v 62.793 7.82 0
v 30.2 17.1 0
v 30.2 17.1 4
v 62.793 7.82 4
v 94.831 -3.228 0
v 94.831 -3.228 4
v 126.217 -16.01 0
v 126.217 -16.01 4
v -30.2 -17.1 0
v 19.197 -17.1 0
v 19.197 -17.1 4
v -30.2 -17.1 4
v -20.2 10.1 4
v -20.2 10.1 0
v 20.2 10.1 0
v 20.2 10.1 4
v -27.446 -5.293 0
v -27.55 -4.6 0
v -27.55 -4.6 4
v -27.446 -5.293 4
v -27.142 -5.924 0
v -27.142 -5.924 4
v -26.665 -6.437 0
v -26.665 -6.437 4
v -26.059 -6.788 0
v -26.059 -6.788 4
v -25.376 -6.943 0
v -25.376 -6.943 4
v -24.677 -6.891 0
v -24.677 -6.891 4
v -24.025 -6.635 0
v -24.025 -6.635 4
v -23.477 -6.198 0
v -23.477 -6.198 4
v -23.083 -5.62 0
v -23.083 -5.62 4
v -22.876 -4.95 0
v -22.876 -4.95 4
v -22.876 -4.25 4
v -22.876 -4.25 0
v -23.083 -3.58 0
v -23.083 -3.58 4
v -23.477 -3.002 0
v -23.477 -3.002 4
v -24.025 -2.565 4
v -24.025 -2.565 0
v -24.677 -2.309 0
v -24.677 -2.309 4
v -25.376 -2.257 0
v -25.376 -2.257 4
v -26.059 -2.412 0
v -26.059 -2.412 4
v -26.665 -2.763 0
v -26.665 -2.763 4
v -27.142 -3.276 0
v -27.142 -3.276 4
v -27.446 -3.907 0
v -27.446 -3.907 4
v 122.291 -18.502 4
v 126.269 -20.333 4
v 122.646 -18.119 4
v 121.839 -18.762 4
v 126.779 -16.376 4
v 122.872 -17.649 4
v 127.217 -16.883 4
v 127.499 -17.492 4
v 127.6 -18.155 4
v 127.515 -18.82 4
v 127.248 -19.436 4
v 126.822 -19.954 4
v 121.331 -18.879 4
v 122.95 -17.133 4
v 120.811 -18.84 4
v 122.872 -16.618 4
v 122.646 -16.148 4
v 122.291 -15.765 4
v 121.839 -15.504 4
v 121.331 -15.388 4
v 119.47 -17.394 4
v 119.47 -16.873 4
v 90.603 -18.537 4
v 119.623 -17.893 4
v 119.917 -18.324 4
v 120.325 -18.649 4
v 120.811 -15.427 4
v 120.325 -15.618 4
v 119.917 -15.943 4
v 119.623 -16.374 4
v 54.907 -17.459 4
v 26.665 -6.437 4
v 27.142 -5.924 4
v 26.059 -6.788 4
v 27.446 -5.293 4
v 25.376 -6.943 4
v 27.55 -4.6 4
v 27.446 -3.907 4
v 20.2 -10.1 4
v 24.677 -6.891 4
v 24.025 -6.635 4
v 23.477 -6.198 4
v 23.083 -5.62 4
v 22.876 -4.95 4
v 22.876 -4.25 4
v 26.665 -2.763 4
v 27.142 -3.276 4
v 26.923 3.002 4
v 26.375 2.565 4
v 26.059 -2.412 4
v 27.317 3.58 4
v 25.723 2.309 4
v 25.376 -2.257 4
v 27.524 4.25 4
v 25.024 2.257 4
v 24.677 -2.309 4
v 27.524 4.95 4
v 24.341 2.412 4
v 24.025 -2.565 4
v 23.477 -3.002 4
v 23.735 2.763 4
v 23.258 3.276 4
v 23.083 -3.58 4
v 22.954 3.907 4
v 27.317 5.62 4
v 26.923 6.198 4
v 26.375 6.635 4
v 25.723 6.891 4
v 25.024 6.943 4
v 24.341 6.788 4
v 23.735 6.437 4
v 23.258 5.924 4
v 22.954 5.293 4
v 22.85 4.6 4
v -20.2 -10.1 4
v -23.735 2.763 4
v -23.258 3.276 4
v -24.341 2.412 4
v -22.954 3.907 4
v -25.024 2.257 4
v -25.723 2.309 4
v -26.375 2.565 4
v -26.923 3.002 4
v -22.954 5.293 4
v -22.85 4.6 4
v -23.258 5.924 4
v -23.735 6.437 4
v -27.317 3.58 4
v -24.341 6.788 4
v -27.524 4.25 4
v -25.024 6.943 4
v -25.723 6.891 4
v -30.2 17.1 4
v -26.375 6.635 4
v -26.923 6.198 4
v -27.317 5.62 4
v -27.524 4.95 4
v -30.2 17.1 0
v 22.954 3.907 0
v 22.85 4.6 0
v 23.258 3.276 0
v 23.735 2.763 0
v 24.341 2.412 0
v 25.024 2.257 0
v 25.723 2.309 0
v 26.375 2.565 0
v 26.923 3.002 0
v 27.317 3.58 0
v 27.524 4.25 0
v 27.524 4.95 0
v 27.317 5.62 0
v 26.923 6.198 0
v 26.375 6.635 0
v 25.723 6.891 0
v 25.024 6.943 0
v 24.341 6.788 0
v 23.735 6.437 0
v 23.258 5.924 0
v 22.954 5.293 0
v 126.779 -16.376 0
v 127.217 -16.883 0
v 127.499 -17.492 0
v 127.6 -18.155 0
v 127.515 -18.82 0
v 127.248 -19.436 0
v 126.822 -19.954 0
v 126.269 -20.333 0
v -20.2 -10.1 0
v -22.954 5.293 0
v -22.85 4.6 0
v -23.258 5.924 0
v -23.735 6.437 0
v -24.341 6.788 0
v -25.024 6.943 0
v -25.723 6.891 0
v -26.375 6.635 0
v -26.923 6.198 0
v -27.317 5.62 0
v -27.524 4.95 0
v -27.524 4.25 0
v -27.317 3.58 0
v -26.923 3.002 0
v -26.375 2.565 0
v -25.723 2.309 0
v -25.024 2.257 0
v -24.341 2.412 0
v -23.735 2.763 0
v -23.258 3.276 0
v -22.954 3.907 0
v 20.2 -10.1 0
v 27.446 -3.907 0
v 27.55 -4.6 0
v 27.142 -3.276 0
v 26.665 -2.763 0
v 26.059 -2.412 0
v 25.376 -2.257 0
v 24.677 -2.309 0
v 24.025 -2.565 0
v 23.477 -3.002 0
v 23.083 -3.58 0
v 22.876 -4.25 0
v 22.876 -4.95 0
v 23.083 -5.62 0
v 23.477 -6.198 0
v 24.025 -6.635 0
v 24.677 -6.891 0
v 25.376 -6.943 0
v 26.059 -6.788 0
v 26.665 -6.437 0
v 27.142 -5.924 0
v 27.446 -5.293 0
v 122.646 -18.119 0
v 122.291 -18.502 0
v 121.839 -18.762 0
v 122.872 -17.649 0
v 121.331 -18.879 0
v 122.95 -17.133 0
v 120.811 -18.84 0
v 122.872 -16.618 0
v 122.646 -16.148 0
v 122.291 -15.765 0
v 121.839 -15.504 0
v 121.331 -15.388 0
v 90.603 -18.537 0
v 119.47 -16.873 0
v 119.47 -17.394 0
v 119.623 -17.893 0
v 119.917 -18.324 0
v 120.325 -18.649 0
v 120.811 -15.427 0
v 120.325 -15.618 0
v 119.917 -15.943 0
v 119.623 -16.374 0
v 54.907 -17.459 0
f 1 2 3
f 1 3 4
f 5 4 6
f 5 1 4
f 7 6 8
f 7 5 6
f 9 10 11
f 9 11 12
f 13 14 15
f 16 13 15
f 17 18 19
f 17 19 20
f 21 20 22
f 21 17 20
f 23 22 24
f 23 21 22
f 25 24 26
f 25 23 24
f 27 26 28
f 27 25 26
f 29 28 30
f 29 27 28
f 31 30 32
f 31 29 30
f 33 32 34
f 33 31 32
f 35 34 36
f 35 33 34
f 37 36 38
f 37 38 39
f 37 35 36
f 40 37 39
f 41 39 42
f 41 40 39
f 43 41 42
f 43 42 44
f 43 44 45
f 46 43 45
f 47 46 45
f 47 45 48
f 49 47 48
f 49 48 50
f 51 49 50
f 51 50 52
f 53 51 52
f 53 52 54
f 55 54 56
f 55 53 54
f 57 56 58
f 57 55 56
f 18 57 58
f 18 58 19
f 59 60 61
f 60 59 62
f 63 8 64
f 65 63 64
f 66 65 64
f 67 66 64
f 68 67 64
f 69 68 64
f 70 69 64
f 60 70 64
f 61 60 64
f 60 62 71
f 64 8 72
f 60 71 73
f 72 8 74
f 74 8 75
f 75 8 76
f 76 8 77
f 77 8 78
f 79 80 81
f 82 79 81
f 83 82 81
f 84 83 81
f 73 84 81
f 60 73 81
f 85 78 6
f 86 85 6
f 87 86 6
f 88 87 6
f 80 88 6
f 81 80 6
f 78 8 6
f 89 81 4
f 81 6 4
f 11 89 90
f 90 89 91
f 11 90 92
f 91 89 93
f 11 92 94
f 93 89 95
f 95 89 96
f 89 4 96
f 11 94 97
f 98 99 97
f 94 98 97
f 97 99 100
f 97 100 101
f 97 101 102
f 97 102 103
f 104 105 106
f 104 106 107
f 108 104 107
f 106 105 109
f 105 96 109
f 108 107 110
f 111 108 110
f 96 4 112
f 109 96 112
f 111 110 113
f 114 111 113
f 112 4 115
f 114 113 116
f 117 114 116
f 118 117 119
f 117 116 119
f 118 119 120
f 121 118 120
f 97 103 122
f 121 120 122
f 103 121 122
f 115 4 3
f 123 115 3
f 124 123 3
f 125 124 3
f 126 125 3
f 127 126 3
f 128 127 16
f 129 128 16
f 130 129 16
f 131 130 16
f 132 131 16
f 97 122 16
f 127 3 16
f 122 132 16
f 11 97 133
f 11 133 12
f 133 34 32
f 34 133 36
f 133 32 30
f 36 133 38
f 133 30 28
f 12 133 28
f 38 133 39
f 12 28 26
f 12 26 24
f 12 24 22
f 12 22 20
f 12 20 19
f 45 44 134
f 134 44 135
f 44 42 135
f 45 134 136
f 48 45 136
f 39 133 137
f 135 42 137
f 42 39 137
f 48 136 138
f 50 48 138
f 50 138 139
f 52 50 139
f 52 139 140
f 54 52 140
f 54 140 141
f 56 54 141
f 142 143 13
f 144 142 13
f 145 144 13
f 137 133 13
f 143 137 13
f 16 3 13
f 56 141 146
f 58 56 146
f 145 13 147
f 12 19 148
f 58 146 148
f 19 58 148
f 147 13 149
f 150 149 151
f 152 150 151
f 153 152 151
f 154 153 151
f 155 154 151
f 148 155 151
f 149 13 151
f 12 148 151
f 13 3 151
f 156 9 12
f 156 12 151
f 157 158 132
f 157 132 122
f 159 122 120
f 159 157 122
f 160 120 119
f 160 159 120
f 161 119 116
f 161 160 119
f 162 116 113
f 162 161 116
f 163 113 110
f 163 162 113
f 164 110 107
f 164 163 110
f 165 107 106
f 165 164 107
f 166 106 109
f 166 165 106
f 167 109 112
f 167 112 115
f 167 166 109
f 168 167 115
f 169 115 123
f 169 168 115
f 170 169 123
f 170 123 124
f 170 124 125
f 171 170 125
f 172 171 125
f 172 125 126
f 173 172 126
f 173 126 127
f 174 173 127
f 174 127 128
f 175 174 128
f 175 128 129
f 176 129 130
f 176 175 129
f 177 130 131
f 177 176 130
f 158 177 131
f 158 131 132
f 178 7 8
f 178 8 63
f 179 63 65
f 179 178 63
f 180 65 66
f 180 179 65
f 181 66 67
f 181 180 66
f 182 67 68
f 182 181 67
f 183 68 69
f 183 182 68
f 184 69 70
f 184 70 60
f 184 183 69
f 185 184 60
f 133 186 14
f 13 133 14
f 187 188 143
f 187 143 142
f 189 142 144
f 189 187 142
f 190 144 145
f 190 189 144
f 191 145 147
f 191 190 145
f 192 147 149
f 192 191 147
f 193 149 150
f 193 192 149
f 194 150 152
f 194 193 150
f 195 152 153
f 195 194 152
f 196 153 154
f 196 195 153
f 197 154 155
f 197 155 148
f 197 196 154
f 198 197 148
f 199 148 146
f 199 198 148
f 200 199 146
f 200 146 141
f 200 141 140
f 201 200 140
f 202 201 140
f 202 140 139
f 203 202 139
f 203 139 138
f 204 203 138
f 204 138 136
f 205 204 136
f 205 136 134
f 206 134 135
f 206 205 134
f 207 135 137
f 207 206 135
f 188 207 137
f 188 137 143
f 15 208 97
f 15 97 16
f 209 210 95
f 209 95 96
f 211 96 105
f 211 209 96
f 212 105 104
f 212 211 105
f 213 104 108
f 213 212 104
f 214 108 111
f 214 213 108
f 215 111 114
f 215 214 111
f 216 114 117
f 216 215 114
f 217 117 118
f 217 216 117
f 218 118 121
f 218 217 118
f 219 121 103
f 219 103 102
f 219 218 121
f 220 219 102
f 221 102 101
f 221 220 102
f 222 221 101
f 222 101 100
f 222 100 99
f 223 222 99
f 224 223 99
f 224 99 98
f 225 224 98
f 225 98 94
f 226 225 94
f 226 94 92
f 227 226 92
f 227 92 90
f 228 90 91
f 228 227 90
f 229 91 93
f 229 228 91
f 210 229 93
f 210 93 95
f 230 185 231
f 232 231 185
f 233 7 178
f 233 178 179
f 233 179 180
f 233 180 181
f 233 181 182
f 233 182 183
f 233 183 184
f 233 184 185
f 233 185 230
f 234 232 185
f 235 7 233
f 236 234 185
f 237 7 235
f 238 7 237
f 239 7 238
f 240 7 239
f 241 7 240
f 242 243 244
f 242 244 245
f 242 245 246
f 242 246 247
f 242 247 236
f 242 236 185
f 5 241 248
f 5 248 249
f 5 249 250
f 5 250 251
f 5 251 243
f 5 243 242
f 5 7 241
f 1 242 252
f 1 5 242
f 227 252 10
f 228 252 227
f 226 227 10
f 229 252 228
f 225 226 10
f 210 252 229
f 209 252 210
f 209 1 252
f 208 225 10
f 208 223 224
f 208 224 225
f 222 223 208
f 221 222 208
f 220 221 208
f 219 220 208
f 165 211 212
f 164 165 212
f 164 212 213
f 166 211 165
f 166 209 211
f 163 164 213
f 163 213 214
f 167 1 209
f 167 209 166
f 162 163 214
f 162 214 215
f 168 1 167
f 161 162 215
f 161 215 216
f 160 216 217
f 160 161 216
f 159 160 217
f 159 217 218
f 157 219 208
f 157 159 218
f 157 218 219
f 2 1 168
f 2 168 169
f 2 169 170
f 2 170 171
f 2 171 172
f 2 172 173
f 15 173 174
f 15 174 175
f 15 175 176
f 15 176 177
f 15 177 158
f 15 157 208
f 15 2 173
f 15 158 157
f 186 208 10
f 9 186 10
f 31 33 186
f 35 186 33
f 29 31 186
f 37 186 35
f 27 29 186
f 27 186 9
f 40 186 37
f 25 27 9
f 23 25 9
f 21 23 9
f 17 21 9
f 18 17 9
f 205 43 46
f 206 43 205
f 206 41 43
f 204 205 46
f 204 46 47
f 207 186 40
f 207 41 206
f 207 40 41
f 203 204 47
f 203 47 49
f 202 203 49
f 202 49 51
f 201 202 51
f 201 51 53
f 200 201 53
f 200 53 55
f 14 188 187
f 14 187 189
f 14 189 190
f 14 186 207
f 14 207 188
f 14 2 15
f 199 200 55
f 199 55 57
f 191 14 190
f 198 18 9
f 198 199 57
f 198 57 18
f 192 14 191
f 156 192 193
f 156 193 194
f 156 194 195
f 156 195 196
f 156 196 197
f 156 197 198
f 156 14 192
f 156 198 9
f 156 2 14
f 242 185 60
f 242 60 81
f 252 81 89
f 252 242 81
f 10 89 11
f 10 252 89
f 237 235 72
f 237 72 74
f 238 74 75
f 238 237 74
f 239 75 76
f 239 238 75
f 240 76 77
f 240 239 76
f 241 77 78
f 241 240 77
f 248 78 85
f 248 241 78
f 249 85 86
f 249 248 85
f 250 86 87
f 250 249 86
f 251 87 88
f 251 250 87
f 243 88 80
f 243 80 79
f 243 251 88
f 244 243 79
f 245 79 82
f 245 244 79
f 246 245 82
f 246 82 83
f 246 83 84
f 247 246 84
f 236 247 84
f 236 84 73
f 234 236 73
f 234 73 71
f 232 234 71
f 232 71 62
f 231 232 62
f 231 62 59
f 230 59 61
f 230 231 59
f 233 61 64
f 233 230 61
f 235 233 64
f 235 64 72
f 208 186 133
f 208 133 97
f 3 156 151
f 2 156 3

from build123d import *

# Parameters (mm, degrees)
SZKIC2_R                    = 2.35
SZKIC2_R_2                  = 1.75
SZKIC2_W                    = 40.4
SZKIC2_H                    = 20.2
DODANIE_WYCI_GNI_CIE1_DEPTH = 4


with BuildPart() as part:
    # Szkic2 → Dodanie-wyciągnięcie1 (new body)
    with BuildSketch(Plane.XY):
        with BuildLine():
            Line((-30.2, 17.1), (30.2, 17.1))
            ThreePointArc((30.2, 17.1), (78.887653554, 2.515256091), (126.216652739, -16.009543491))
            ThreePointArc((126.216652739, -16.009543491), (127.600370297, -18.154974458), (126.269263581, -20.333437957))
            ThreePointArc((126.269263581, -20.333437957), (72.757727431, -17.908543704), (19.197379501, -17.1))
            Line((19.197379501, -17.1), (-30.2, -17.1))
            Line((-30.2, -17.1), (-30.2, 17.1))
        make_face()
        with Locations((-25.2, 4.6)):
            Circle(SZKIC2_R, mode=Mode.SUBTRACT)
        with Locations(Location((25.2, 4.6, 0), (0, 0, 180))):
            Circle(SZKIC2_R, mode=Mode.SUBTRACT)
        with Locations((25.2, -4.6)):
            Circle(SZKIC2_R, mode=Mode.SUBTRACT)
        with Locations(Location((-25.2, -4.6, 0), (0, 0, 180))):
            Circle(SZKIC2_R, mode=Mode.SUBTRACT)
        with Locations((121.2, -17.133437957)):
            Circle(SZKIC2_R_2, mode=Mode.SUBTRACT)
        Rectangle(SZKIC2_W, SZKIC2_H, mode=Mode.SUBTRACT)
    extrude(amount=DODANIE_WYCI_GNI_CIE1_DEPTH)


solid = part.part
